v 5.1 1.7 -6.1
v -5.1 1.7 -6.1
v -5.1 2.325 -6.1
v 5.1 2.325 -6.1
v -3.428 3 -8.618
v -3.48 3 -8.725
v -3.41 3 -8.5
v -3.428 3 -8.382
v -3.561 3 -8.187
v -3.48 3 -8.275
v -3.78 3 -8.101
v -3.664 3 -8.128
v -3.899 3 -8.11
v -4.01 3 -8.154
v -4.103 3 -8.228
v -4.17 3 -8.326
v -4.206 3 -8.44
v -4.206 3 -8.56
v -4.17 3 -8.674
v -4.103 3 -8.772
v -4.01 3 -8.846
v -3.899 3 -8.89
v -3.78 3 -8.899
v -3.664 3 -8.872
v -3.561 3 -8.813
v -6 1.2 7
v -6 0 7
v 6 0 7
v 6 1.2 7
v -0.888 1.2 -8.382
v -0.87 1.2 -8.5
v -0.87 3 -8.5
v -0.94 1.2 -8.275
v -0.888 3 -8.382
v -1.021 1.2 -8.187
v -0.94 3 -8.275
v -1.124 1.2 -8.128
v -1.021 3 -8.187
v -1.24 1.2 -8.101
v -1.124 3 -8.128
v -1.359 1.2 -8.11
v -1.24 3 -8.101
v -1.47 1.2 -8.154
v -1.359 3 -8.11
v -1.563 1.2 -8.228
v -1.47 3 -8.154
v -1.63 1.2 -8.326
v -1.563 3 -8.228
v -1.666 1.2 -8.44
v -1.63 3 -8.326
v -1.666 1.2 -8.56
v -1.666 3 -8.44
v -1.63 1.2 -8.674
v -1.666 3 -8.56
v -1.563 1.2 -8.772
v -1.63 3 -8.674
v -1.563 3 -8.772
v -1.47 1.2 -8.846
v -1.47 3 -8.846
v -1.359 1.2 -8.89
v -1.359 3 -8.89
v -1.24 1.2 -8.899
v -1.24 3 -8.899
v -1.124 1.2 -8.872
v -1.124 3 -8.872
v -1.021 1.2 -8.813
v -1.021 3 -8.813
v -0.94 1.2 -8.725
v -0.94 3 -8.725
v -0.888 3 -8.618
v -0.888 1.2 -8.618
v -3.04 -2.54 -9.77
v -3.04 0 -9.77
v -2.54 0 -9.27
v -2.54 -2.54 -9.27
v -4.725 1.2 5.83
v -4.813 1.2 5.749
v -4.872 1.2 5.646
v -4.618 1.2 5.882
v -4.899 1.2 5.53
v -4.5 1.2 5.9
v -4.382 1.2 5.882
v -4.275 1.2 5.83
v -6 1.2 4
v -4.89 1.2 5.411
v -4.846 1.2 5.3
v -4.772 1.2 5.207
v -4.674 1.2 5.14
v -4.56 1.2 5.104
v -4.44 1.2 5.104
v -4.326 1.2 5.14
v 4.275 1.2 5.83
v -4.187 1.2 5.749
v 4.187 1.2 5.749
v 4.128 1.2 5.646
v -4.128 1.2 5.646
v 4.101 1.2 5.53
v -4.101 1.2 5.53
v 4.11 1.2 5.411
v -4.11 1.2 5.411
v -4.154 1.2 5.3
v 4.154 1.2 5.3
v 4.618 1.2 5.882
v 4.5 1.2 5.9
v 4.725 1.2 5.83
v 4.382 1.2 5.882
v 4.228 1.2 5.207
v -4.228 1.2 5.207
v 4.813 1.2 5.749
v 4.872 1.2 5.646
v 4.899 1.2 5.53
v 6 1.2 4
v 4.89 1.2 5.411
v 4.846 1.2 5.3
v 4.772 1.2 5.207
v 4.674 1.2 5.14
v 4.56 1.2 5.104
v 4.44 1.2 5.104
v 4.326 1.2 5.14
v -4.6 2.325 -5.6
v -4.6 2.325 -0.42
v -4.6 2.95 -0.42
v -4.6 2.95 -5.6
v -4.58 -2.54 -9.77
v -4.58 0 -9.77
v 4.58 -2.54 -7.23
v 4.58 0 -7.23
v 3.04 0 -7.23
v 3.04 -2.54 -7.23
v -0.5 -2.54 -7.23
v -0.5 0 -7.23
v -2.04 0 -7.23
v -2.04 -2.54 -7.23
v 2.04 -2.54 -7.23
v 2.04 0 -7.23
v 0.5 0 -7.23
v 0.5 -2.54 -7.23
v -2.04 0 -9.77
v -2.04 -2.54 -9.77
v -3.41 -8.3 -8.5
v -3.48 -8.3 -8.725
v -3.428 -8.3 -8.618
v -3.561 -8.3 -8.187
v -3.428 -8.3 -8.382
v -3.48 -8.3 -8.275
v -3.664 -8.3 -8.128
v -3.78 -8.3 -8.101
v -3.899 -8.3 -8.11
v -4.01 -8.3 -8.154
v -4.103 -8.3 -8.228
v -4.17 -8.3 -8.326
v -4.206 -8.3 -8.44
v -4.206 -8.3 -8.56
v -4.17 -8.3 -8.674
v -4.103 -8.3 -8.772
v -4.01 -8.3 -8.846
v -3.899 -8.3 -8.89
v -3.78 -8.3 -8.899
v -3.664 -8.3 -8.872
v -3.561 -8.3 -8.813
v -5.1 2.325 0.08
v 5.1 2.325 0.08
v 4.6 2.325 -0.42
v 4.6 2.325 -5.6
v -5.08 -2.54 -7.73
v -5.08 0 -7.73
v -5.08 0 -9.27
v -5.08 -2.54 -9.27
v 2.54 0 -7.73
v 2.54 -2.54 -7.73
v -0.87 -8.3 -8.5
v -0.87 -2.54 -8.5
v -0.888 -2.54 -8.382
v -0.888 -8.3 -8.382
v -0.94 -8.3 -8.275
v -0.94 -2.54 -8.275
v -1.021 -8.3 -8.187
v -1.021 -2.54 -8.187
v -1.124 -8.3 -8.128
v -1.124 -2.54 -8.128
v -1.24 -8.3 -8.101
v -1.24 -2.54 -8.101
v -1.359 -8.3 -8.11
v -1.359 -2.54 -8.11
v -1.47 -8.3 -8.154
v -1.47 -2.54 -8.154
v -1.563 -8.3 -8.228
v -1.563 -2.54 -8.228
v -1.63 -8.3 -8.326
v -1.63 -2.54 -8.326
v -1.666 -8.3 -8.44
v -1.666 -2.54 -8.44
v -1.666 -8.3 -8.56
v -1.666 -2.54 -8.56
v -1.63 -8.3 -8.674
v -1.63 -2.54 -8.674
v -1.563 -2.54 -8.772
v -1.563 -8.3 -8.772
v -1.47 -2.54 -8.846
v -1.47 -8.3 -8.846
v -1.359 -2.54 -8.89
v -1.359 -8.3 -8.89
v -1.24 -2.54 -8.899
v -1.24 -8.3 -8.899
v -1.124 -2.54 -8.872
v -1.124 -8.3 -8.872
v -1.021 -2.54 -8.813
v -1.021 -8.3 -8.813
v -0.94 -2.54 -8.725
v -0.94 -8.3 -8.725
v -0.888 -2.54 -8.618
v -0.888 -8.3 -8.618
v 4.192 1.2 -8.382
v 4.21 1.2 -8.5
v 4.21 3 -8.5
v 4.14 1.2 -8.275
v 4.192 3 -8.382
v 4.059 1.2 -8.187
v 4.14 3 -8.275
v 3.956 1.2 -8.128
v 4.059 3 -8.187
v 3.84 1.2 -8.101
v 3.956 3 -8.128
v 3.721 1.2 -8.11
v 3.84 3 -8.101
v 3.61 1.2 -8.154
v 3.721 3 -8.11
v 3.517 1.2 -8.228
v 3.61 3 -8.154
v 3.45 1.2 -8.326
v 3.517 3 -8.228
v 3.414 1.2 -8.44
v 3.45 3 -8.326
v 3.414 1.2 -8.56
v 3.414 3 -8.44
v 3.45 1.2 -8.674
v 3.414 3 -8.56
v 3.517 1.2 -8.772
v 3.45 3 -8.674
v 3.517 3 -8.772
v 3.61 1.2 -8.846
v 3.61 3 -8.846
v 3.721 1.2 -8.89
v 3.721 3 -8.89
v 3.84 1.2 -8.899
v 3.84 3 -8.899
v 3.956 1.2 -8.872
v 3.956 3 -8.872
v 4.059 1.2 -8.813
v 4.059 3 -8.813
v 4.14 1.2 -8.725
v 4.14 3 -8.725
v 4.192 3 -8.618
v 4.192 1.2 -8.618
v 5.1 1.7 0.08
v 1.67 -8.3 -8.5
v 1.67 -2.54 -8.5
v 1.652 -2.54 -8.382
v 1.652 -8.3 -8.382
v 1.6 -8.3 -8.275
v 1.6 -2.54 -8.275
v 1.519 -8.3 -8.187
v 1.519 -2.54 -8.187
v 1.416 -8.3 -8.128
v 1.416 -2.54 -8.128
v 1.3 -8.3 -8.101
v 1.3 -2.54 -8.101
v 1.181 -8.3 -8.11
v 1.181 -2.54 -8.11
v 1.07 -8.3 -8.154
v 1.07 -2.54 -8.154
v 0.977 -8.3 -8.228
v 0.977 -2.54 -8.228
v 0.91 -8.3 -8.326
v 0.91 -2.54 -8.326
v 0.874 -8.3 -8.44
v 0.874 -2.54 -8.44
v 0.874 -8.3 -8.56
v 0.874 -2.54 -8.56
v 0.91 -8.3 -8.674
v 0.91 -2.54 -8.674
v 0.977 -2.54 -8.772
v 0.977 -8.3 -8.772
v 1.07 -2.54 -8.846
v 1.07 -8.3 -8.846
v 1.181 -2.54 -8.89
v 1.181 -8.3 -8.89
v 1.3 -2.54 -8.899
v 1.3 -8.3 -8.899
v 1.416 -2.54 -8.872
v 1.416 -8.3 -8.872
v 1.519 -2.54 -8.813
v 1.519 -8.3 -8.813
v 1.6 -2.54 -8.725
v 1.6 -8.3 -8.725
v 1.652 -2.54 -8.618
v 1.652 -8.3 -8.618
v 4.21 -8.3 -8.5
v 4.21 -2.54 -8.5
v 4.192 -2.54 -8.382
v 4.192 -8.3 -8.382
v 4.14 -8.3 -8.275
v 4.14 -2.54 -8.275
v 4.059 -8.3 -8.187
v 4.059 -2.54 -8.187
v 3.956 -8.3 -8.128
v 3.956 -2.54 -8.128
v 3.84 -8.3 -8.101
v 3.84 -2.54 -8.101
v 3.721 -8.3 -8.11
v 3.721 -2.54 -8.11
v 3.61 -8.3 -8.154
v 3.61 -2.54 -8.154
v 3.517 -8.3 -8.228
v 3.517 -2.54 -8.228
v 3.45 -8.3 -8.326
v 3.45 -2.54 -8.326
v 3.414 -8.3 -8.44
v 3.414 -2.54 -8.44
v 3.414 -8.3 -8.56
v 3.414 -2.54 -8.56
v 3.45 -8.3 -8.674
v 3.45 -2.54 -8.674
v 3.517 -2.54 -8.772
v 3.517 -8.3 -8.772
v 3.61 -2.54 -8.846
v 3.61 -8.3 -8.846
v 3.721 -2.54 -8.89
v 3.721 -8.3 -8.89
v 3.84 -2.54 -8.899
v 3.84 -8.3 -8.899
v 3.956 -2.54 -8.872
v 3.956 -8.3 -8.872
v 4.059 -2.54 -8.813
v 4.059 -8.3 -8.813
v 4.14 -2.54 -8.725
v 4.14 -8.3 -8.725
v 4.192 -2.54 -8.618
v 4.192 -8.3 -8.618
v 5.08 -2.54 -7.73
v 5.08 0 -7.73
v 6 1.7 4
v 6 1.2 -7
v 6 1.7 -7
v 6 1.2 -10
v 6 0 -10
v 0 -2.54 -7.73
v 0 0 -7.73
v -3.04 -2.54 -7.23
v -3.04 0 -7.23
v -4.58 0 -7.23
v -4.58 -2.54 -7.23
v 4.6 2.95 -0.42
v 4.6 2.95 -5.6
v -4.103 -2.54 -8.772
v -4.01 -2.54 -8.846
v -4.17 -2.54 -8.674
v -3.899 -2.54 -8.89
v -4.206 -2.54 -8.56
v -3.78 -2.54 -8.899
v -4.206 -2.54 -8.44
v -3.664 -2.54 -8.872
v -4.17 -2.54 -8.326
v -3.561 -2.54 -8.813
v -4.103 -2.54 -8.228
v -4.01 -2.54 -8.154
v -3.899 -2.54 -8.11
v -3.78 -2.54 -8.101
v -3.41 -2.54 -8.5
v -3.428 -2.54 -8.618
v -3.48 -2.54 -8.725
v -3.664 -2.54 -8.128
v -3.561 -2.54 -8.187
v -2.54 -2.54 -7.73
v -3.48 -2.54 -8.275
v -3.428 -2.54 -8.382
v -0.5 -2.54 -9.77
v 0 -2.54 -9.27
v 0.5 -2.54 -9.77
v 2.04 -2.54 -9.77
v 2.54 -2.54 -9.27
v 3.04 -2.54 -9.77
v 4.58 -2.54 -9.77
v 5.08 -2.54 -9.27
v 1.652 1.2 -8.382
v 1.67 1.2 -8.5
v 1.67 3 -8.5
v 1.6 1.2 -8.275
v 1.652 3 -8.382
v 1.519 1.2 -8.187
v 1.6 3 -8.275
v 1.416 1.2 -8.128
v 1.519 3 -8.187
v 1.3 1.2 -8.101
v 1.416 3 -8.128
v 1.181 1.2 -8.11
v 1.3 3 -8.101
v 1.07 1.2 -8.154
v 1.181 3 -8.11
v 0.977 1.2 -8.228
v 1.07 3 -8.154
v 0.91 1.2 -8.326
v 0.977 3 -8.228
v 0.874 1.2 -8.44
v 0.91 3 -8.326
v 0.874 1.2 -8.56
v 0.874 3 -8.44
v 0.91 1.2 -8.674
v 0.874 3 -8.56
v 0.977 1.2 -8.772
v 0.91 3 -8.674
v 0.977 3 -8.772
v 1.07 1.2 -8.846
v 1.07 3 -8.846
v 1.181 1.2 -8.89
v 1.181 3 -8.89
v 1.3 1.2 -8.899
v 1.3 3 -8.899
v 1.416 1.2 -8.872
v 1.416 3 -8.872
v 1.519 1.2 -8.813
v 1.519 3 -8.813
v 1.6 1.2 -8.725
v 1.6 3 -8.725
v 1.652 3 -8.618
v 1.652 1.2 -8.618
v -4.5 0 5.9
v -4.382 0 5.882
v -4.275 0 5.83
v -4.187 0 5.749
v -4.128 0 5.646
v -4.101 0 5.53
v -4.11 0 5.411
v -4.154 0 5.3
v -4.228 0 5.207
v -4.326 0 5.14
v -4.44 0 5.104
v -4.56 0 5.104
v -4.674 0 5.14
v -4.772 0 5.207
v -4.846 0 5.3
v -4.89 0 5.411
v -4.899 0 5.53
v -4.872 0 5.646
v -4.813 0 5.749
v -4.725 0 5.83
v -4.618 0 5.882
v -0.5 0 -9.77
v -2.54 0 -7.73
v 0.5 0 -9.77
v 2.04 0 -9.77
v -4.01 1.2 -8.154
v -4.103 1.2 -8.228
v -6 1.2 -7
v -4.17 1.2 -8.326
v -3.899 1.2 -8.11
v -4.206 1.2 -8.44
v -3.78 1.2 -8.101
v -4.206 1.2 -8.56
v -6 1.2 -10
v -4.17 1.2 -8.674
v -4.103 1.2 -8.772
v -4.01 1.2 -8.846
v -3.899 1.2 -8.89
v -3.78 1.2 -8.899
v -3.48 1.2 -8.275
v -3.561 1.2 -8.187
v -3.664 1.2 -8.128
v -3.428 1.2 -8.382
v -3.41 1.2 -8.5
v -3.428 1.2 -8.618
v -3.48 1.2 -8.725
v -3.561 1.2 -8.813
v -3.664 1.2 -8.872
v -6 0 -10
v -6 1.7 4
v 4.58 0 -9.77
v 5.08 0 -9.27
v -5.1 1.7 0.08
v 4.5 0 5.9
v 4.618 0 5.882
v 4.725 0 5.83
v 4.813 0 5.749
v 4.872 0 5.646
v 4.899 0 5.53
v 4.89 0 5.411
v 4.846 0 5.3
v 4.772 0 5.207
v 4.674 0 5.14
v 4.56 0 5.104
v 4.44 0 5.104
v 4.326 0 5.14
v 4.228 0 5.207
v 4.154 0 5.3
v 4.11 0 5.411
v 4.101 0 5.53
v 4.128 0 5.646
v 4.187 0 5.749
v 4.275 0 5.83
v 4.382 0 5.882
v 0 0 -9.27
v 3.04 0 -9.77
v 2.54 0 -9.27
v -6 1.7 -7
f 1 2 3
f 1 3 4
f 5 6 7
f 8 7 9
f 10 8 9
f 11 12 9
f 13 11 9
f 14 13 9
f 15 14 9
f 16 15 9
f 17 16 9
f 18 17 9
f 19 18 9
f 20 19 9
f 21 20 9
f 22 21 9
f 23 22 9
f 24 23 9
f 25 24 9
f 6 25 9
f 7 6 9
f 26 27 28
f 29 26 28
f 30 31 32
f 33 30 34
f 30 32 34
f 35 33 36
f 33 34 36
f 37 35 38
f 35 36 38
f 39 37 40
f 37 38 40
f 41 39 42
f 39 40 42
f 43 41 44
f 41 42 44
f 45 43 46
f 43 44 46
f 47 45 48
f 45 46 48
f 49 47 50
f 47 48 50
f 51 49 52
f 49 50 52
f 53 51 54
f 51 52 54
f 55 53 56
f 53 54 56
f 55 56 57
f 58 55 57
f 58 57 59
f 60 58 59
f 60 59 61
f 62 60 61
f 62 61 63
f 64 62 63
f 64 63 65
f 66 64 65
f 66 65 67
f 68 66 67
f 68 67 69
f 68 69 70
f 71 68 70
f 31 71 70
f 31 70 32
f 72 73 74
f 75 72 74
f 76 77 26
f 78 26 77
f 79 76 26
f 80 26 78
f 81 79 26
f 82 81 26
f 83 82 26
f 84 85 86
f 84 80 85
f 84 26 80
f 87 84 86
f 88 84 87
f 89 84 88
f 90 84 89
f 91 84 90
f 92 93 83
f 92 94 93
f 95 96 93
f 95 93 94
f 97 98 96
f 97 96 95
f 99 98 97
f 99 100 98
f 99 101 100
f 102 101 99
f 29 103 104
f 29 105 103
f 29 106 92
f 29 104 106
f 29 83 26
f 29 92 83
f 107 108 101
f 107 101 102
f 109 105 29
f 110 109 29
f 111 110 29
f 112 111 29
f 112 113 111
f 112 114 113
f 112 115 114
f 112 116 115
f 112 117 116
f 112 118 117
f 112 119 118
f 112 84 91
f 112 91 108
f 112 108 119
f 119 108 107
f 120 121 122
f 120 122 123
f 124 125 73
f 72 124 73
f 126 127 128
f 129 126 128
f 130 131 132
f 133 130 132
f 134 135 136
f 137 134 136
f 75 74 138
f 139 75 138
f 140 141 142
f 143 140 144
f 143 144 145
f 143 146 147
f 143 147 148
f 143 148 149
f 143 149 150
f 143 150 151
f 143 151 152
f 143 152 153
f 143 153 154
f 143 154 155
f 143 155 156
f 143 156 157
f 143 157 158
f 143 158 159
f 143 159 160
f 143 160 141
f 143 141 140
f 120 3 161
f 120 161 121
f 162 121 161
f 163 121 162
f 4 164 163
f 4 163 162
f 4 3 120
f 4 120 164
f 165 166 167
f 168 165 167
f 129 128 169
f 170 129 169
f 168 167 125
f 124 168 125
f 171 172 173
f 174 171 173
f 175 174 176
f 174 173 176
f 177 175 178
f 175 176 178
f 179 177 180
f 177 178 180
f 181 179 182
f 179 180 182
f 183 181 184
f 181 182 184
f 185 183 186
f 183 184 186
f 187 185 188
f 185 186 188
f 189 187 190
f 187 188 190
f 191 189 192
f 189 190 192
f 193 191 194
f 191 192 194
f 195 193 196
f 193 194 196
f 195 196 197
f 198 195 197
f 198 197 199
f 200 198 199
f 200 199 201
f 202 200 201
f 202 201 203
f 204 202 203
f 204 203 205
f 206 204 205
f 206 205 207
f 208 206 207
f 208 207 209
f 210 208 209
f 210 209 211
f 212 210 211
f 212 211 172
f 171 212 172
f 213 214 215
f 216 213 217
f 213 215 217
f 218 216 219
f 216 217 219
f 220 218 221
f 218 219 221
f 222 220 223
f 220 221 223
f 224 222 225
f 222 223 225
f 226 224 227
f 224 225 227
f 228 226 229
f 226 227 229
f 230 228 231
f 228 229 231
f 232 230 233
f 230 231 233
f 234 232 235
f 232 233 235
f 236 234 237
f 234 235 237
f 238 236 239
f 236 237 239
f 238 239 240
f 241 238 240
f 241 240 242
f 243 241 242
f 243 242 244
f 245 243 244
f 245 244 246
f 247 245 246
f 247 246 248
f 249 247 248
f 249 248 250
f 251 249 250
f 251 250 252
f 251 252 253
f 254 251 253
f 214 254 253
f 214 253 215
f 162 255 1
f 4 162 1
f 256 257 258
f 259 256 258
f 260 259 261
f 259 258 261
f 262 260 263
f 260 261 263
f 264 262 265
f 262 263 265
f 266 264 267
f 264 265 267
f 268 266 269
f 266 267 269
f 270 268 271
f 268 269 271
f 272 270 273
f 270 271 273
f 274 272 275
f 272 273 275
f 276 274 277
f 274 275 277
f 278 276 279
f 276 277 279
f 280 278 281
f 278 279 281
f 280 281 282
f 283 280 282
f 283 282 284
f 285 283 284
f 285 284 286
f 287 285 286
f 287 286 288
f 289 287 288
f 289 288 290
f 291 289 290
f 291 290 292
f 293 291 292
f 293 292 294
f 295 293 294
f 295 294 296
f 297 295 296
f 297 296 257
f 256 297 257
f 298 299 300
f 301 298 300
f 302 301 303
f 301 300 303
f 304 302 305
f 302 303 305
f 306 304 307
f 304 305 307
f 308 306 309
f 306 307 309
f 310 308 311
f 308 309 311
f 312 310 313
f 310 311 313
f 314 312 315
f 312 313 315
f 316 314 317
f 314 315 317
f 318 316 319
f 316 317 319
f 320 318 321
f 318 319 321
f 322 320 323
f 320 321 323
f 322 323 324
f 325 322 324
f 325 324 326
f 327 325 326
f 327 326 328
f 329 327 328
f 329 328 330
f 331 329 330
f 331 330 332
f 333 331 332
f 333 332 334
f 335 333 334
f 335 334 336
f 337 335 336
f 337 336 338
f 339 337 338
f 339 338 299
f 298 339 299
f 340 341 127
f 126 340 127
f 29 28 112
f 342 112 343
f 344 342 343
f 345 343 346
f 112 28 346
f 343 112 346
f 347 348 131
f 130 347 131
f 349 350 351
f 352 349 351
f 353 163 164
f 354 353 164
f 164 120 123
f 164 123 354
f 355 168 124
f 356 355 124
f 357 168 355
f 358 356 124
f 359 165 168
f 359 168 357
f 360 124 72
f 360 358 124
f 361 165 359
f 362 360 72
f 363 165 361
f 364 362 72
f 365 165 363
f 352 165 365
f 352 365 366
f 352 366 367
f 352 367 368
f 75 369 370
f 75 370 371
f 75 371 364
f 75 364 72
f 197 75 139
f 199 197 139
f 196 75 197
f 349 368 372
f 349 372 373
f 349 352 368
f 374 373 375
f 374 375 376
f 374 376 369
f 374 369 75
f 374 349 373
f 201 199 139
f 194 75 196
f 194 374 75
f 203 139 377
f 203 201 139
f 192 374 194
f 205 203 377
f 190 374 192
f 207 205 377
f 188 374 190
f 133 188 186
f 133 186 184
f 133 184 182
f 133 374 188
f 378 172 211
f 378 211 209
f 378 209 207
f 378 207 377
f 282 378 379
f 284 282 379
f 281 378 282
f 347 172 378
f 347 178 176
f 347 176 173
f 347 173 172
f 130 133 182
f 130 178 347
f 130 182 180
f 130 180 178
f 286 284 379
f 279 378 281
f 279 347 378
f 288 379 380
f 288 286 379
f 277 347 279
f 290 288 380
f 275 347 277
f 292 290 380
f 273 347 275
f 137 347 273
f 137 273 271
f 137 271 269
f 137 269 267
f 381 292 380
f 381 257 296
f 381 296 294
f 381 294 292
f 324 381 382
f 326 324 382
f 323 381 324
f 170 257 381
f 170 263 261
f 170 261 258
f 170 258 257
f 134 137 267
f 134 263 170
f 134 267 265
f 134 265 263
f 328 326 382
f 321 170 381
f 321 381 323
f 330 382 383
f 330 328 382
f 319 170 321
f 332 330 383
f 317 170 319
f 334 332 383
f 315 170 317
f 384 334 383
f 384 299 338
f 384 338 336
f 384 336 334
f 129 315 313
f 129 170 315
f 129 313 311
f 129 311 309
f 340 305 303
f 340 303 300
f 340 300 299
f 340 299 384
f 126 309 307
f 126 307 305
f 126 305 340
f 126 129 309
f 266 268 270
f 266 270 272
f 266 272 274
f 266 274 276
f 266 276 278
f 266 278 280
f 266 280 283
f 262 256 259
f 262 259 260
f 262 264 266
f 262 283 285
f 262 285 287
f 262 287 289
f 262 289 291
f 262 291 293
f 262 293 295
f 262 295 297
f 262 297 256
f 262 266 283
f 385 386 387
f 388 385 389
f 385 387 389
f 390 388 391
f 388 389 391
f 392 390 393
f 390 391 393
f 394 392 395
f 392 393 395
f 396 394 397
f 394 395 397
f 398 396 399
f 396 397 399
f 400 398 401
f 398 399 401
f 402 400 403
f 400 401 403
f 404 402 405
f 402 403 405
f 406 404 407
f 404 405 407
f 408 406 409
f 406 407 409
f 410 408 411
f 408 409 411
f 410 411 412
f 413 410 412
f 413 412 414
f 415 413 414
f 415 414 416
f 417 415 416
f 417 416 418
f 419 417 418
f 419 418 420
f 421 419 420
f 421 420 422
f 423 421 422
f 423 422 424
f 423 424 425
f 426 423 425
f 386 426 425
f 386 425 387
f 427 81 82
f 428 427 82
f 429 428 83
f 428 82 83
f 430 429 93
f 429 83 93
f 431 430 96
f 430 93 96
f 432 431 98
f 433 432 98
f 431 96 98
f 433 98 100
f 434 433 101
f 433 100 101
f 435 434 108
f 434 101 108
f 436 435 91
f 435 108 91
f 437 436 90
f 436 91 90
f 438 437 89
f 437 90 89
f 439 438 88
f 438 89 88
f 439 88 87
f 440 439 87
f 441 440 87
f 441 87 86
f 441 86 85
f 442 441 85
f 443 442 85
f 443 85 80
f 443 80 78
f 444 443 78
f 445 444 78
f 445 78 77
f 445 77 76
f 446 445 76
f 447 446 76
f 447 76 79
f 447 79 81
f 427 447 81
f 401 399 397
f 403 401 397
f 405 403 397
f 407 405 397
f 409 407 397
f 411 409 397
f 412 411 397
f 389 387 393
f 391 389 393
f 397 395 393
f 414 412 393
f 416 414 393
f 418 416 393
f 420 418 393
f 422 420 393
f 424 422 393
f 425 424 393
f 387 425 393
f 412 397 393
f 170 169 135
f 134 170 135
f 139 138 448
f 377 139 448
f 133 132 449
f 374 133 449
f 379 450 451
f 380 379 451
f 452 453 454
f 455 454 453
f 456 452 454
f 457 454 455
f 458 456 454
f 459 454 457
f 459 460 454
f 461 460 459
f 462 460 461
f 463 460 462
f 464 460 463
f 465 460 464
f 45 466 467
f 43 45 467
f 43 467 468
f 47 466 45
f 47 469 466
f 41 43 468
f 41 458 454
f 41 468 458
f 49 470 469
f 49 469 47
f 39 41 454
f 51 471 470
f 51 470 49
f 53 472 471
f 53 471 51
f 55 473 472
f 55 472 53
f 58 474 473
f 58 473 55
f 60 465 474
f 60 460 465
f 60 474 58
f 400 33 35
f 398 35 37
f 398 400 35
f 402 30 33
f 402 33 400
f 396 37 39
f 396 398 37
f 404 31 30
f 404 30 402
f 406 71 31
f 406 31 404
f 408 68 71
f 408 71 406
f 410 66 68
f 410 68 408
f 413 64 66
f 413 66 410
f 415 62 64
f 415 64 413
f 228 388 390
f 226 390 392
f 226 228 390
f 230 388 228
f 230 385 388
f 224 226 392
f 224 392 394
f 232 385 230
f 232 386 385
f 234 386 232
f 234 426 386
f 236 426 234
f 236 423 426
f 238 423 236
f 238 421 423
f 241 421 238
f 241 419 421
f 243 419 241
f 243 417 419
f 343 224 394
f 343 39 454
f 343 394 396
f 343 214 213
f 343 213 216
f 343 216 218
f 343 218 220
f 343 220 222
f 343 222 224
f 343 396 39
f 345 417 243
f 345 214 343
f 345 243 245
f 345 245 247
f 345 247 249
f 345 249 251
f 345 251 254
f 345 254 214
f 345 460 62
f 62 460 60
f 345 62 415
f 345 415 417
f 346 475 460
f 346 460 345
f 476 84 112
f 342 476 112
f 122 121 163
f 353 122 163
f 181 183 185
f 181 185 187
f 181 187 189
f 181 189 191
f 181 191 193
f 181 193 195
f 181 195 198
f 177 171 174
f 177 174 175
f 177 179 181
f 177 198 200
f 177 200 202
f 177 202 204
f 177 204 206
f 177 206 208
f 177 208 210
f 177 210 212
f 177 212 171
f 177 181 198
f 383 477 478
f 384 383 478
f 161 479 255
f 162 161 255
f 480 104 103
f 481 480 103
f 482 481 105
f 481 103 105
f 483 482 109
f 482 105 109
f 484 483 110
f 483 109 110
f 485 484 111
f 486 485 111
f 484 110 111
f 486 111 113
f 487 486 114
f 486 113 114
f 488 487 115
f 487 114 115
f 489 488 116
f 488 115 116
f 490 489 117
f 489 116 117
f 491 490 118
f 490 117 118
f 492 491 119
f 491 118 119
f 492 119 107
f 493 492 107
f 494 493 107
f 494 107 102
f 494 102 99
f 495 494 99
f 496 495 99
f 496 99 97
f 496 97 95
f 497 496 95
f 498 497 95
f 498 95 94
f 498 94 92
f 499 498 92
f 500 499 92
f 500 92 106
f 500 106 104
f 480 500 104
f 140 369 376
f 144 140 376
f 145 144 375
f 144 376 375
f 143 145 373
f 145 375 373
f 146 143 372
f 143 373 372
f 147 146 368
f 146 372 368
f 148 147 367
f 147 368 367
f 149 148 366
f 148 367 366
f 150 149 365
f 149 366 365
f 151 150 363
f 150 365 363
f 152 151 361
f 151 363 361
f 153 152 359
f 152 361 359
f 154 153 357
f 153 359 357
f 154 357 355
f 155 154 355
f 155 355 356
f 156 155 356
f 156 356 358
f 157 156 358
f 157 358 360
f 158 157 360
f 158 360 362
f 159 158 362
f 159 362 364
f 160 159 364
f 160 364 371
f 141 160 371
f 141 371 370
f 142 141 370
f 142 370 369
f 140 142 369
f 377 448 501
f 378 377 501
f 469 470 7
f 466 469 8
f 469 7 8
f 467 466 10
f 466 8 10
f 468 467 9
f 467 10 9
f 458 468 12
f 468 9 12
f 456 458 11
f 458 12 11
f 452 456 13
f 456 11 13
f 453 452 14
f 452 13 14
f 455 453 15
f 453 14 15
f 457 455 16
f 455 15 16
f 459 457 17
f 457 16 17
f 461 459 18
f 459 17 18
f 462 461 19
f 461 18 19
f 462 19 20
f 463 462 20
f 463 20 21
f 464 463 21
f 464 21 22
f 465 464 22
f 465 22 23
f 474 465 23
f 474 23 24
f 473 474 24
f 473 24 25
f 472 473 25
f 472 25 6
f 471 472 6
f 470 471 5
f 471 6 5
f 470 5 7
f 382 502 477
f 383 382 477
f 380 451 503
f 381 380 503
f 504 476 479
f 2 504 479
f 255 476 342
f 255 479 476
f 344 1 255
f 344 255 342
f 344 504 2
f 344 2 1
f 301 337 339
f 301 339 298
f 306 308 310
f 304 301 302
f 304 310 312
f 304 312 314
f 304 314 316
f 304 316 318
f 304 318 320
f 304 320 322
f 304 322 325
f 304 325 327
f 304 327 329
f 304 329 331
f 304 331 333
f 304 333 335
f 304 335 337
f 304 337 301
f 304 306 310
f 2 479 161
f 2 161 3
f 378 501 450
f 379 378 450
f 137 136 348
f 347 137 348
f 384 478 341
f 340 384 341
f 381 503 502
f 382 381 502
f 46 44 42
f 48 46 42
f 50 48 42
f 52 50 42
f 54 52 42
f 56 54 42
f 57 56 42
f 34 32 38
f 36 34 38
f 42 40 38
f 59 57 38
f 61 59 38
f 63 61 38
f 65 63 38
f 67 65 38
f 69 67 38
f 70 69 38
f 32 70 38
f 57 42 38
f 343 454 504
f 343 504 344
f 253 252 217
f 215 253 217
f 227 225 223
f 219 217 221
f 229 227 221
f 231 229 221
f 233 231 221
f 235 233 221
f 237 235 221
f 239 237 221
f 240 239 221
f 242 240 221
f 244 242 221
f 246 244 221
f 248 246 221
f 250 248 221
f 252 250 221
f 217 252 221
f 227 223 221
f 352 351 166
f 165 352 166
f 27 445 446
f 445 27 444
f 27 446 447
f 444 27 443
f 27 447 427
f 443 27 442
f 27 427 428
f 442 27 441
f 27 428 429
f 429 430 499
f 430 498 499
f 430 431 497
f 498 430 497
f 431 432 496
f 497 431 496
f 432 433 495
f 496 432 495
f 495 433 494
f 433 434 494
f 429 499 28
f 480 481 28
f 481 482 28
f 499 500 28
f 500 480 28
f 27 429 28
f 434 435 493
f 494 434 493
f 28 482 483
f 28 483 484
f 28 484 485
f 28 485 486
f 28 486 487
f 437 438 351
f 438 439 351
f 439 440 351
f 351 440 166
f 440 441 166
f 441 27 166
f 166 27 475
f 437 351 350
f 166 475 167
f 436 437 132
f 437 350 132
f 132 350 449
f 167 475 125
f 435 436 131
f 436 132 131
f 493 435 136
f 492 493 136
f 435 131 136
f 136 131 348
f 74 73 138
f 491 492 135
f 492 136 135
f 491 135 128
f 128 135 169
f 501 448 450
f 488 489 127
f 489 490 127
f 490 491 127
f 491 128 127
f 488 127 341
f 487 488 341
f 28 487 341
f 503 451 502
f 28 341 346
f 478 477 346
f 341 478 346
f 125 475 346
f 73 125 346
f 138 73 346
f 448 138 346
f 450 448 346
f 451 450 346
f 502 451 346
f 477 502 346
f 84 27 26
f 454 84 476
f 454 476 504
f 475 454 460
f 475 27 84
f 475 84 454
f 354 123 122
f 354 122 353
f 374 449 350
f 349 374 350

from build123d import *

# Parameters (mm, degrees)
SKETCH1_W               = 12
SKETCH1_H               = 17
BOSS_EXTRUDE1_DEPTH     = 1.2
SKETCH2_W               = 12
SKETCH2_H               = 11
BOSS_EXTRUDE2_DEPTH     = 0.5
SKETCH3_R               = 0.4
CUT_EXTRUDE1_DEPTH      = 12.723480712
SKETCH4_W               = 10.2
SKETCH4_H               = 6.18
BOSS_EXTRUDE3_DEPTH     = 0.625
SKETCH5_W               = 9.2
SKETCH5_H               = 5.18
BOSS_EXTRUDE4_DEPTH     = 0.625
SKETCH6_R               = 0.4
BOSS_EXTRUDE5_DEPTH     = 2.54
BOSS_EXTRUDE6_START     = -3
BOSS_EXTRUDE6_OUTLINE_R = 0.4
BOSS_EXTRUDE6_DEPTH     = 11.3


# Read off the part's stored shape, not the designer's step: Boss-Extrude6
with BuildPart() as part:
    # Sketch1 → Boss-Extrude1 (new body)
    with BuildSketch(Plane(origin=(0, 0, 0), x_dir=(1, 0, 0), z_dir=(0, 1, 0))):
        with Locations((0, 1.5)):
            Rectangle(SKETCH1_W, SKETCH1_H)
    extrude(amount=BOSS_EXTRUDE1_DEPTH)

    # Sketch2 → Boss-Extrude2 (add)
    with BuildSketch(Plane(origin=(0, 1.2, 0), x_dir=(1, 0, 0), z_dir=(0, 1, 0))):
        with Locations((0, 1.5)):
            Rectangle(SKETCH2_W, SKETCH2_H)
    extrude(amount=BOSS_EXTRUDE2_DEPTH)

    # Sketch3 → Cut-Extrude1 (cut, through all)
    with BuildSketch(Plane(origin=(0, 1.2, 0), x_dir=(1, 0, 0), z_dir=(0, 1, 0))):
        with Locations(Location((-3.81, 8.5, 0), (0, 0, 270))):
            Circle(SKETCH3_R)
        with Locations(Location((-4.5, -5.5, 0), (0, 0, 270))):
            Circle(SKETCH3_R)
        with Locations(Location((4.5, -5.5, 0), (0, 0, 270))):
            Circle(SKETCH3_R)
        with Locations(Location((-1.27, 8.5, 0), (0, 0, 270))):
            Circle(SKETCH3_R)
        with Locations(Location((1.27, 8.5, 0), (0, 0, 270))):
            Circle(SKETCH3_R)
        with Locations(Location((3.81, 8.5, 0), (0, 0, 270))):
            Circle(SKETCH3_R)
    extrude(amount=-CUT_EXTRUDE1_DEPTH, mode=Mode.SUBTRACT)

    # Sketch4 → Boss-Extrude3 (add)
    with BuildSketch(Plane(origin=(0, 1.7, 0), x_dir=(1, 0, 0), z_dir=(0, 1, 0))):
        with Locations((0, 3.01)):
            Rectangle(SKETCH4_W, SKETCH4_H)
    extrude(amount=BOSS_EXTRUDE3_DEPTH)

    # Sketch5 → Boss-Extrude4 (add)
    with BuildSketch(Plane(origin=(0, 2.325, 0), x_dir=(1, 0, 0), z_dir=(0, 1, 0))):
        with Locations((0, 3.01)):
            Rectangle(SKETCH5_W, SKETCH5_H)
    extrude(amount=BOSS_EXTRUDE4_DEPTH)

    # Sketch6 → Boss-Extrude5 (add)
    with BuildSketch(Plane.XZ):
        Polygon((-3.04, -7.23), (-4.58, -7.23), (-5.08, -7.73), (-5.08, -9.27), (-4.58, -9.77), (-3.04, -9.77), (-2.54, -9.27), (-2.04, -9.77), (-0.5, -9.77), (0, -9.27), (0.5, -9.77), (2.04, -9.77), (2.54, -9.27), (3.04, -9.77), (4.58, -9.77), (5.08, -9.27), (5.08, -7.73), (4.58, -7.23), (3.04, -7.23), (2.54, -7.73), (2.04, -7.23), (0.5, -7.23), (0, -7.73), (-0.5, -7.23), (-2.04, -7.23), (-2.54, -7.73), align=None)
        with Locations(Location((-3.81, -8.5, 0), (0, 0, 90))):
            Circle(SKETCH6_R, mode=Mode.SUBTRACT)
        with Locations(Location((-1.27, -8.5, 0), (0, 0, 90))):
            Circle(SKETCH6_R, mode=Mode.SUBTRACT)
        with Locations(Location((1.27, -8.5, 0), (0, 0, 90))):
            Circle(SKETCH6_R, mode=Mode.SUBTRACT)
        with Locations(Location((3.81, -8.5, 0), (0, 0, 90))):
            Circle(SKETCH6_R, mode=Mode.SUBTRACT)
    extrude(amount=BOSS_EXTRUDE5_DEPTH)

    # Boss-Extrude6 outline → Boss-Extrude6 (add)
    with BuildSketch(Plane.XZ.offset(BOSS_EXTRUDE6_START)):
        with Locations((-3.81, -8.5)):
            Circle(BOSS_EXTRUDE6_OUTLINE_R)
        with Locations((-1.27, -8.5)):
            Circle(BOSS_EXTRUDE6_OUTLINE_R)
        with Locations((1.27, -8.5)):
            Circle(BOSS_EXTRUDE6_OUTLINE_R)
        with Locations((3.81, -8.5)):
            Circle(BOSS_EXTRUDE6_OUTLINE_R)
    extrude(amount=BOSS_EXTRUDE6_DEPTH)


solid = part.part
